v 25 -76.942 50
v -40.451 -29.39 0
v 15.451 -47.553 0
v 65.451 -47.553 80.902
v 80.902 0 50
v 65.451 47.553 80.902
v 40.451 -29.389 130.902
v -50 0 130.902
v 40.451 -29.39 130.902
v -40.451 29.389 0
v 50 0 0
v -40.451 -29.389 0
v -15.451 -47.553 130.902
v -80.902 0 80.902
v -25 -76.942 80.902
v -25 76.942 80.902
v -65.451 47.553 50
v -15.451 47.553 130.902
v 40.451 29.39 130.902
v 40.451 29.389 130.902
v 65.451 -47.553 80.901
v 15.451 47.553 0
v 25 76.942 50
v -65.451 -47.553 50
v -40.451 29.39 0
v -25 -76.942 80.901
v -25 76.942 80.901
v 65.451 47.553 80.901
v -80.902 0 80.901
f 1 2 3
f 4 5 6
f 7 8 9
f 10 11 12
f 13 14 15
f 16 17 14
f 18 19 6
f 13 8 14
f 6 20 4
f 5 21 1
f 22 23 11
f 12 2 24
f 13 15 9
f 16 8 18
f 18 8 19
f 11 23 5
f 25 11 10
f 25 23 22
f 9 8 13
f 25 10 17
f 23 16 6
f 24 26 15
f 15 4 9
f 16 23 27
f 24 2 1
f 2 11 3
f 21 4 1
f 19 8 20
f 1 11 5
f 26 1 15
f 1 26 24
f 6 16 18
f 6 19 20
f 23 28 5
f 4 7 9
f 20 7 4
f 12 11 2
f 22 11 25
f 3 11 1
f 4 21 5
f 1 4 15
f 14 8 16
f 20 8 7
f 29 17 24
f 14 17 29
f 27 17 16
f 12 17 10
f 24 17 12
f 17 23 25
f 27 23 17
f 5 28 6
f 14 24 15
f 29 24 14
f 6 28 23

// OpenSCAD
base = 50;

gold = (1 + sqrt(5)) / 2;
h1 = 1;
h2 = gold;
r = gold;
epsilon = 0.00001;

module g(p) {
    translate(p) cube([epsilon, epsilon, epsilon], center=true);
}

scale(base) hull() {
    for (i = [0 : 4]) {
        rotate(i * 72) {
            g([1, 0, 0]);
            g([r, 0, h1]);
            rotate(36) g([r, 0, h2]);
            rotate(36) g([1, 0, h1 + h2]);
        }
    }
}
